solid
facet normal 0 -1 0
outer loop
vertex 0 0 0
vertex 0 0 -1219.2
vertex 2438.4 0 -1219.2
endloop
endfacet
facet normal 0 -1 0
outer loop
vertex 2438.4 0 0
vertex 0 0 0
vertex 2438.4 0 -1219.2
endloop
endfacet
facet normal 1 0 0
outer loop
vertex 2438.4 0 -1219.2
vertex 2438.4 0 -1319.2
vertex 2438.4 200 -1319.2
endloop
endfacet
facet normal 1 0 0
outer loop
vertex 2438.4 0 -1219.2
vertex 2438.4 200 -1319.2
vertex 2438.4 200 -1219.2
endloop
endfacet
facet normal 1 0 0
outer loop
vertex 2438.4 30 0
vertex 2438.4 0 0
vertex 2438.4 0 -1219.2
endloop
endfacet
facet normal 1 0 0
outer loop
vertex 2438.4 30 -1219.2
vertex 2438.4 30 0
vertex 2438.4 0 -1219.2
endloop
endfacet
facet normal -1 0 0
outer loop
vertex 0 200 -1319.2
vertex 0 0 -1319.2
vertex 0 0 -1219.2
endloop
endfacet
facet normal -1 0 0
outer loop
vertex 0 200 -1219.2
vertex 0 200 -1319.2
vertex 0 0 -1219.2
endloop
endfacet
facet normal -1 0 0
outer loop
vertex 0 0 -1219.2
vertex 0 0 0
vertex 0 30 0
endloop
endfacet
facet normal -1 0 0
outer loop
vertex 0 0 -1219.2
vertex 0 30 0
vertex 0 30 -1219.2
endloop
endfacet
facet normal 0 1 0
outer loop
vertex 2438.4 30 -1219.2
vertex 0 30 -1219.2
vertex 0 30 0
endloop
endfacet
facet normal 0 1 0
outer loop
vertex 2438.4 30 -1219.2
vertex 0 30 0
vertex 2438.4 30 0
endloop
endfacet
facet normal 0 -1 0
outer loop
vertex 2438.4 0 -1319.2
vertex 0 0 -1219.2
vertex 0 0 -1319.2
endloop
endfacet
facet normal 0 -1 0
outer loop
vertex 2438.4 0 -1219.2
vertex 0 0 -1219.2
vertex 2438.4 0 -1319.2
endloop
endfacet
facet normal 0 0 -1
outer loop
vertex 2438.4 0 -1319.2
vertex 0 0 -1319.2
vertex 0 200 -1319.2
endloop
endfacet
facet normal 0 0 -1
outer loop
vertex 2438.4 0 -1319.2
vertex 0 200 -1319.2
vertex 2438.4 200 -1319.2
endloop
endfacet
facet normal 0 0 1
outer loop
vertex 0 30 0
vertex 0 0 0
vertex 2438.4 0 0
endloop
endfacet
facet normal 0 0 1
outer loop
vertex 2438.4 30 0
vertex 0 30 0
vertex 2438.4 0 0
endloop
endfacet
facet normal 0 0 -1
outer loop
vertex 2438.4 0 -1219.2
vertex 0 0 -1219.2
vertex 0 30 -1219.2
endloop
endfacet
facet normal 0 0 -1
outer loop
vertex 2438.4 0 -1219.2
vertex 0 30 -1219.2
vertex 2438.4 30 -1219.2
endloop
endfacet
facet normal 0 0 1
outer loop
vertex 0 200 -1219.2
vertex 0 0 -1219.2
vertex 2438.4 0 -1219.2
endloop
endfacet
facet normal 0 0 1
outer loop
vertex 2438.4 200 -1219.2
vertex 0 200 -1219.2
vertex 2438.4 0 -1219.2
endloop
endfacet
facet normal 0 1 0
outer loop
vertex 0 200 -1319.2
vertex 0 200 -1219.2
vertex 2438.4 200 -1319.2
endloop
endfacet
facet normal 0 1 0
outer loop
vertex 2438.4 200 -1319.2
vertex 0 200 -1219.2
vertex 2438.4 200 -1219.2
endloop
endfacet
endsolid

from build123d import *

# Parameters (mm, degrees)
SKETCH1_W           = 2438.4
SKETCH1_H           = 1219.2
BOSS_EXTRUDE1_DEPTH = 30
SKETCH2_W           = 2438.4
SKETCH2_H           = 100
BOSS_EXTRUDE2_DEPTH = 200


with BuildPart() as part:
    # Sketch1 → Boss-Extrude1 (new body)
    with BuildSketch(Plane(origin=(0, 0, 0), x_dir=(1, 0, 0), z_dir=(0, 1, 0))):
        with Locations((1219.2, 609.6)):
            Rectangle(SKETCH1_W, SKETCH1_H)
    extrude(amount=BOSS_EXTRUDE1_DEPTH)


with BuildPart() as body_2:
    # Sketch2 → Boss-Extrude2 (new body)
    with BuildSketch(Plane.XZ):
        with Locations((1219.2, -1269.2)):
            Rectangle(SKETCH2_W, SKETCH2_H)
    extrude(amount=-BOSS_EXTRUDE2_DEPTH)


solid = Compound([part.part, body_2.part])
